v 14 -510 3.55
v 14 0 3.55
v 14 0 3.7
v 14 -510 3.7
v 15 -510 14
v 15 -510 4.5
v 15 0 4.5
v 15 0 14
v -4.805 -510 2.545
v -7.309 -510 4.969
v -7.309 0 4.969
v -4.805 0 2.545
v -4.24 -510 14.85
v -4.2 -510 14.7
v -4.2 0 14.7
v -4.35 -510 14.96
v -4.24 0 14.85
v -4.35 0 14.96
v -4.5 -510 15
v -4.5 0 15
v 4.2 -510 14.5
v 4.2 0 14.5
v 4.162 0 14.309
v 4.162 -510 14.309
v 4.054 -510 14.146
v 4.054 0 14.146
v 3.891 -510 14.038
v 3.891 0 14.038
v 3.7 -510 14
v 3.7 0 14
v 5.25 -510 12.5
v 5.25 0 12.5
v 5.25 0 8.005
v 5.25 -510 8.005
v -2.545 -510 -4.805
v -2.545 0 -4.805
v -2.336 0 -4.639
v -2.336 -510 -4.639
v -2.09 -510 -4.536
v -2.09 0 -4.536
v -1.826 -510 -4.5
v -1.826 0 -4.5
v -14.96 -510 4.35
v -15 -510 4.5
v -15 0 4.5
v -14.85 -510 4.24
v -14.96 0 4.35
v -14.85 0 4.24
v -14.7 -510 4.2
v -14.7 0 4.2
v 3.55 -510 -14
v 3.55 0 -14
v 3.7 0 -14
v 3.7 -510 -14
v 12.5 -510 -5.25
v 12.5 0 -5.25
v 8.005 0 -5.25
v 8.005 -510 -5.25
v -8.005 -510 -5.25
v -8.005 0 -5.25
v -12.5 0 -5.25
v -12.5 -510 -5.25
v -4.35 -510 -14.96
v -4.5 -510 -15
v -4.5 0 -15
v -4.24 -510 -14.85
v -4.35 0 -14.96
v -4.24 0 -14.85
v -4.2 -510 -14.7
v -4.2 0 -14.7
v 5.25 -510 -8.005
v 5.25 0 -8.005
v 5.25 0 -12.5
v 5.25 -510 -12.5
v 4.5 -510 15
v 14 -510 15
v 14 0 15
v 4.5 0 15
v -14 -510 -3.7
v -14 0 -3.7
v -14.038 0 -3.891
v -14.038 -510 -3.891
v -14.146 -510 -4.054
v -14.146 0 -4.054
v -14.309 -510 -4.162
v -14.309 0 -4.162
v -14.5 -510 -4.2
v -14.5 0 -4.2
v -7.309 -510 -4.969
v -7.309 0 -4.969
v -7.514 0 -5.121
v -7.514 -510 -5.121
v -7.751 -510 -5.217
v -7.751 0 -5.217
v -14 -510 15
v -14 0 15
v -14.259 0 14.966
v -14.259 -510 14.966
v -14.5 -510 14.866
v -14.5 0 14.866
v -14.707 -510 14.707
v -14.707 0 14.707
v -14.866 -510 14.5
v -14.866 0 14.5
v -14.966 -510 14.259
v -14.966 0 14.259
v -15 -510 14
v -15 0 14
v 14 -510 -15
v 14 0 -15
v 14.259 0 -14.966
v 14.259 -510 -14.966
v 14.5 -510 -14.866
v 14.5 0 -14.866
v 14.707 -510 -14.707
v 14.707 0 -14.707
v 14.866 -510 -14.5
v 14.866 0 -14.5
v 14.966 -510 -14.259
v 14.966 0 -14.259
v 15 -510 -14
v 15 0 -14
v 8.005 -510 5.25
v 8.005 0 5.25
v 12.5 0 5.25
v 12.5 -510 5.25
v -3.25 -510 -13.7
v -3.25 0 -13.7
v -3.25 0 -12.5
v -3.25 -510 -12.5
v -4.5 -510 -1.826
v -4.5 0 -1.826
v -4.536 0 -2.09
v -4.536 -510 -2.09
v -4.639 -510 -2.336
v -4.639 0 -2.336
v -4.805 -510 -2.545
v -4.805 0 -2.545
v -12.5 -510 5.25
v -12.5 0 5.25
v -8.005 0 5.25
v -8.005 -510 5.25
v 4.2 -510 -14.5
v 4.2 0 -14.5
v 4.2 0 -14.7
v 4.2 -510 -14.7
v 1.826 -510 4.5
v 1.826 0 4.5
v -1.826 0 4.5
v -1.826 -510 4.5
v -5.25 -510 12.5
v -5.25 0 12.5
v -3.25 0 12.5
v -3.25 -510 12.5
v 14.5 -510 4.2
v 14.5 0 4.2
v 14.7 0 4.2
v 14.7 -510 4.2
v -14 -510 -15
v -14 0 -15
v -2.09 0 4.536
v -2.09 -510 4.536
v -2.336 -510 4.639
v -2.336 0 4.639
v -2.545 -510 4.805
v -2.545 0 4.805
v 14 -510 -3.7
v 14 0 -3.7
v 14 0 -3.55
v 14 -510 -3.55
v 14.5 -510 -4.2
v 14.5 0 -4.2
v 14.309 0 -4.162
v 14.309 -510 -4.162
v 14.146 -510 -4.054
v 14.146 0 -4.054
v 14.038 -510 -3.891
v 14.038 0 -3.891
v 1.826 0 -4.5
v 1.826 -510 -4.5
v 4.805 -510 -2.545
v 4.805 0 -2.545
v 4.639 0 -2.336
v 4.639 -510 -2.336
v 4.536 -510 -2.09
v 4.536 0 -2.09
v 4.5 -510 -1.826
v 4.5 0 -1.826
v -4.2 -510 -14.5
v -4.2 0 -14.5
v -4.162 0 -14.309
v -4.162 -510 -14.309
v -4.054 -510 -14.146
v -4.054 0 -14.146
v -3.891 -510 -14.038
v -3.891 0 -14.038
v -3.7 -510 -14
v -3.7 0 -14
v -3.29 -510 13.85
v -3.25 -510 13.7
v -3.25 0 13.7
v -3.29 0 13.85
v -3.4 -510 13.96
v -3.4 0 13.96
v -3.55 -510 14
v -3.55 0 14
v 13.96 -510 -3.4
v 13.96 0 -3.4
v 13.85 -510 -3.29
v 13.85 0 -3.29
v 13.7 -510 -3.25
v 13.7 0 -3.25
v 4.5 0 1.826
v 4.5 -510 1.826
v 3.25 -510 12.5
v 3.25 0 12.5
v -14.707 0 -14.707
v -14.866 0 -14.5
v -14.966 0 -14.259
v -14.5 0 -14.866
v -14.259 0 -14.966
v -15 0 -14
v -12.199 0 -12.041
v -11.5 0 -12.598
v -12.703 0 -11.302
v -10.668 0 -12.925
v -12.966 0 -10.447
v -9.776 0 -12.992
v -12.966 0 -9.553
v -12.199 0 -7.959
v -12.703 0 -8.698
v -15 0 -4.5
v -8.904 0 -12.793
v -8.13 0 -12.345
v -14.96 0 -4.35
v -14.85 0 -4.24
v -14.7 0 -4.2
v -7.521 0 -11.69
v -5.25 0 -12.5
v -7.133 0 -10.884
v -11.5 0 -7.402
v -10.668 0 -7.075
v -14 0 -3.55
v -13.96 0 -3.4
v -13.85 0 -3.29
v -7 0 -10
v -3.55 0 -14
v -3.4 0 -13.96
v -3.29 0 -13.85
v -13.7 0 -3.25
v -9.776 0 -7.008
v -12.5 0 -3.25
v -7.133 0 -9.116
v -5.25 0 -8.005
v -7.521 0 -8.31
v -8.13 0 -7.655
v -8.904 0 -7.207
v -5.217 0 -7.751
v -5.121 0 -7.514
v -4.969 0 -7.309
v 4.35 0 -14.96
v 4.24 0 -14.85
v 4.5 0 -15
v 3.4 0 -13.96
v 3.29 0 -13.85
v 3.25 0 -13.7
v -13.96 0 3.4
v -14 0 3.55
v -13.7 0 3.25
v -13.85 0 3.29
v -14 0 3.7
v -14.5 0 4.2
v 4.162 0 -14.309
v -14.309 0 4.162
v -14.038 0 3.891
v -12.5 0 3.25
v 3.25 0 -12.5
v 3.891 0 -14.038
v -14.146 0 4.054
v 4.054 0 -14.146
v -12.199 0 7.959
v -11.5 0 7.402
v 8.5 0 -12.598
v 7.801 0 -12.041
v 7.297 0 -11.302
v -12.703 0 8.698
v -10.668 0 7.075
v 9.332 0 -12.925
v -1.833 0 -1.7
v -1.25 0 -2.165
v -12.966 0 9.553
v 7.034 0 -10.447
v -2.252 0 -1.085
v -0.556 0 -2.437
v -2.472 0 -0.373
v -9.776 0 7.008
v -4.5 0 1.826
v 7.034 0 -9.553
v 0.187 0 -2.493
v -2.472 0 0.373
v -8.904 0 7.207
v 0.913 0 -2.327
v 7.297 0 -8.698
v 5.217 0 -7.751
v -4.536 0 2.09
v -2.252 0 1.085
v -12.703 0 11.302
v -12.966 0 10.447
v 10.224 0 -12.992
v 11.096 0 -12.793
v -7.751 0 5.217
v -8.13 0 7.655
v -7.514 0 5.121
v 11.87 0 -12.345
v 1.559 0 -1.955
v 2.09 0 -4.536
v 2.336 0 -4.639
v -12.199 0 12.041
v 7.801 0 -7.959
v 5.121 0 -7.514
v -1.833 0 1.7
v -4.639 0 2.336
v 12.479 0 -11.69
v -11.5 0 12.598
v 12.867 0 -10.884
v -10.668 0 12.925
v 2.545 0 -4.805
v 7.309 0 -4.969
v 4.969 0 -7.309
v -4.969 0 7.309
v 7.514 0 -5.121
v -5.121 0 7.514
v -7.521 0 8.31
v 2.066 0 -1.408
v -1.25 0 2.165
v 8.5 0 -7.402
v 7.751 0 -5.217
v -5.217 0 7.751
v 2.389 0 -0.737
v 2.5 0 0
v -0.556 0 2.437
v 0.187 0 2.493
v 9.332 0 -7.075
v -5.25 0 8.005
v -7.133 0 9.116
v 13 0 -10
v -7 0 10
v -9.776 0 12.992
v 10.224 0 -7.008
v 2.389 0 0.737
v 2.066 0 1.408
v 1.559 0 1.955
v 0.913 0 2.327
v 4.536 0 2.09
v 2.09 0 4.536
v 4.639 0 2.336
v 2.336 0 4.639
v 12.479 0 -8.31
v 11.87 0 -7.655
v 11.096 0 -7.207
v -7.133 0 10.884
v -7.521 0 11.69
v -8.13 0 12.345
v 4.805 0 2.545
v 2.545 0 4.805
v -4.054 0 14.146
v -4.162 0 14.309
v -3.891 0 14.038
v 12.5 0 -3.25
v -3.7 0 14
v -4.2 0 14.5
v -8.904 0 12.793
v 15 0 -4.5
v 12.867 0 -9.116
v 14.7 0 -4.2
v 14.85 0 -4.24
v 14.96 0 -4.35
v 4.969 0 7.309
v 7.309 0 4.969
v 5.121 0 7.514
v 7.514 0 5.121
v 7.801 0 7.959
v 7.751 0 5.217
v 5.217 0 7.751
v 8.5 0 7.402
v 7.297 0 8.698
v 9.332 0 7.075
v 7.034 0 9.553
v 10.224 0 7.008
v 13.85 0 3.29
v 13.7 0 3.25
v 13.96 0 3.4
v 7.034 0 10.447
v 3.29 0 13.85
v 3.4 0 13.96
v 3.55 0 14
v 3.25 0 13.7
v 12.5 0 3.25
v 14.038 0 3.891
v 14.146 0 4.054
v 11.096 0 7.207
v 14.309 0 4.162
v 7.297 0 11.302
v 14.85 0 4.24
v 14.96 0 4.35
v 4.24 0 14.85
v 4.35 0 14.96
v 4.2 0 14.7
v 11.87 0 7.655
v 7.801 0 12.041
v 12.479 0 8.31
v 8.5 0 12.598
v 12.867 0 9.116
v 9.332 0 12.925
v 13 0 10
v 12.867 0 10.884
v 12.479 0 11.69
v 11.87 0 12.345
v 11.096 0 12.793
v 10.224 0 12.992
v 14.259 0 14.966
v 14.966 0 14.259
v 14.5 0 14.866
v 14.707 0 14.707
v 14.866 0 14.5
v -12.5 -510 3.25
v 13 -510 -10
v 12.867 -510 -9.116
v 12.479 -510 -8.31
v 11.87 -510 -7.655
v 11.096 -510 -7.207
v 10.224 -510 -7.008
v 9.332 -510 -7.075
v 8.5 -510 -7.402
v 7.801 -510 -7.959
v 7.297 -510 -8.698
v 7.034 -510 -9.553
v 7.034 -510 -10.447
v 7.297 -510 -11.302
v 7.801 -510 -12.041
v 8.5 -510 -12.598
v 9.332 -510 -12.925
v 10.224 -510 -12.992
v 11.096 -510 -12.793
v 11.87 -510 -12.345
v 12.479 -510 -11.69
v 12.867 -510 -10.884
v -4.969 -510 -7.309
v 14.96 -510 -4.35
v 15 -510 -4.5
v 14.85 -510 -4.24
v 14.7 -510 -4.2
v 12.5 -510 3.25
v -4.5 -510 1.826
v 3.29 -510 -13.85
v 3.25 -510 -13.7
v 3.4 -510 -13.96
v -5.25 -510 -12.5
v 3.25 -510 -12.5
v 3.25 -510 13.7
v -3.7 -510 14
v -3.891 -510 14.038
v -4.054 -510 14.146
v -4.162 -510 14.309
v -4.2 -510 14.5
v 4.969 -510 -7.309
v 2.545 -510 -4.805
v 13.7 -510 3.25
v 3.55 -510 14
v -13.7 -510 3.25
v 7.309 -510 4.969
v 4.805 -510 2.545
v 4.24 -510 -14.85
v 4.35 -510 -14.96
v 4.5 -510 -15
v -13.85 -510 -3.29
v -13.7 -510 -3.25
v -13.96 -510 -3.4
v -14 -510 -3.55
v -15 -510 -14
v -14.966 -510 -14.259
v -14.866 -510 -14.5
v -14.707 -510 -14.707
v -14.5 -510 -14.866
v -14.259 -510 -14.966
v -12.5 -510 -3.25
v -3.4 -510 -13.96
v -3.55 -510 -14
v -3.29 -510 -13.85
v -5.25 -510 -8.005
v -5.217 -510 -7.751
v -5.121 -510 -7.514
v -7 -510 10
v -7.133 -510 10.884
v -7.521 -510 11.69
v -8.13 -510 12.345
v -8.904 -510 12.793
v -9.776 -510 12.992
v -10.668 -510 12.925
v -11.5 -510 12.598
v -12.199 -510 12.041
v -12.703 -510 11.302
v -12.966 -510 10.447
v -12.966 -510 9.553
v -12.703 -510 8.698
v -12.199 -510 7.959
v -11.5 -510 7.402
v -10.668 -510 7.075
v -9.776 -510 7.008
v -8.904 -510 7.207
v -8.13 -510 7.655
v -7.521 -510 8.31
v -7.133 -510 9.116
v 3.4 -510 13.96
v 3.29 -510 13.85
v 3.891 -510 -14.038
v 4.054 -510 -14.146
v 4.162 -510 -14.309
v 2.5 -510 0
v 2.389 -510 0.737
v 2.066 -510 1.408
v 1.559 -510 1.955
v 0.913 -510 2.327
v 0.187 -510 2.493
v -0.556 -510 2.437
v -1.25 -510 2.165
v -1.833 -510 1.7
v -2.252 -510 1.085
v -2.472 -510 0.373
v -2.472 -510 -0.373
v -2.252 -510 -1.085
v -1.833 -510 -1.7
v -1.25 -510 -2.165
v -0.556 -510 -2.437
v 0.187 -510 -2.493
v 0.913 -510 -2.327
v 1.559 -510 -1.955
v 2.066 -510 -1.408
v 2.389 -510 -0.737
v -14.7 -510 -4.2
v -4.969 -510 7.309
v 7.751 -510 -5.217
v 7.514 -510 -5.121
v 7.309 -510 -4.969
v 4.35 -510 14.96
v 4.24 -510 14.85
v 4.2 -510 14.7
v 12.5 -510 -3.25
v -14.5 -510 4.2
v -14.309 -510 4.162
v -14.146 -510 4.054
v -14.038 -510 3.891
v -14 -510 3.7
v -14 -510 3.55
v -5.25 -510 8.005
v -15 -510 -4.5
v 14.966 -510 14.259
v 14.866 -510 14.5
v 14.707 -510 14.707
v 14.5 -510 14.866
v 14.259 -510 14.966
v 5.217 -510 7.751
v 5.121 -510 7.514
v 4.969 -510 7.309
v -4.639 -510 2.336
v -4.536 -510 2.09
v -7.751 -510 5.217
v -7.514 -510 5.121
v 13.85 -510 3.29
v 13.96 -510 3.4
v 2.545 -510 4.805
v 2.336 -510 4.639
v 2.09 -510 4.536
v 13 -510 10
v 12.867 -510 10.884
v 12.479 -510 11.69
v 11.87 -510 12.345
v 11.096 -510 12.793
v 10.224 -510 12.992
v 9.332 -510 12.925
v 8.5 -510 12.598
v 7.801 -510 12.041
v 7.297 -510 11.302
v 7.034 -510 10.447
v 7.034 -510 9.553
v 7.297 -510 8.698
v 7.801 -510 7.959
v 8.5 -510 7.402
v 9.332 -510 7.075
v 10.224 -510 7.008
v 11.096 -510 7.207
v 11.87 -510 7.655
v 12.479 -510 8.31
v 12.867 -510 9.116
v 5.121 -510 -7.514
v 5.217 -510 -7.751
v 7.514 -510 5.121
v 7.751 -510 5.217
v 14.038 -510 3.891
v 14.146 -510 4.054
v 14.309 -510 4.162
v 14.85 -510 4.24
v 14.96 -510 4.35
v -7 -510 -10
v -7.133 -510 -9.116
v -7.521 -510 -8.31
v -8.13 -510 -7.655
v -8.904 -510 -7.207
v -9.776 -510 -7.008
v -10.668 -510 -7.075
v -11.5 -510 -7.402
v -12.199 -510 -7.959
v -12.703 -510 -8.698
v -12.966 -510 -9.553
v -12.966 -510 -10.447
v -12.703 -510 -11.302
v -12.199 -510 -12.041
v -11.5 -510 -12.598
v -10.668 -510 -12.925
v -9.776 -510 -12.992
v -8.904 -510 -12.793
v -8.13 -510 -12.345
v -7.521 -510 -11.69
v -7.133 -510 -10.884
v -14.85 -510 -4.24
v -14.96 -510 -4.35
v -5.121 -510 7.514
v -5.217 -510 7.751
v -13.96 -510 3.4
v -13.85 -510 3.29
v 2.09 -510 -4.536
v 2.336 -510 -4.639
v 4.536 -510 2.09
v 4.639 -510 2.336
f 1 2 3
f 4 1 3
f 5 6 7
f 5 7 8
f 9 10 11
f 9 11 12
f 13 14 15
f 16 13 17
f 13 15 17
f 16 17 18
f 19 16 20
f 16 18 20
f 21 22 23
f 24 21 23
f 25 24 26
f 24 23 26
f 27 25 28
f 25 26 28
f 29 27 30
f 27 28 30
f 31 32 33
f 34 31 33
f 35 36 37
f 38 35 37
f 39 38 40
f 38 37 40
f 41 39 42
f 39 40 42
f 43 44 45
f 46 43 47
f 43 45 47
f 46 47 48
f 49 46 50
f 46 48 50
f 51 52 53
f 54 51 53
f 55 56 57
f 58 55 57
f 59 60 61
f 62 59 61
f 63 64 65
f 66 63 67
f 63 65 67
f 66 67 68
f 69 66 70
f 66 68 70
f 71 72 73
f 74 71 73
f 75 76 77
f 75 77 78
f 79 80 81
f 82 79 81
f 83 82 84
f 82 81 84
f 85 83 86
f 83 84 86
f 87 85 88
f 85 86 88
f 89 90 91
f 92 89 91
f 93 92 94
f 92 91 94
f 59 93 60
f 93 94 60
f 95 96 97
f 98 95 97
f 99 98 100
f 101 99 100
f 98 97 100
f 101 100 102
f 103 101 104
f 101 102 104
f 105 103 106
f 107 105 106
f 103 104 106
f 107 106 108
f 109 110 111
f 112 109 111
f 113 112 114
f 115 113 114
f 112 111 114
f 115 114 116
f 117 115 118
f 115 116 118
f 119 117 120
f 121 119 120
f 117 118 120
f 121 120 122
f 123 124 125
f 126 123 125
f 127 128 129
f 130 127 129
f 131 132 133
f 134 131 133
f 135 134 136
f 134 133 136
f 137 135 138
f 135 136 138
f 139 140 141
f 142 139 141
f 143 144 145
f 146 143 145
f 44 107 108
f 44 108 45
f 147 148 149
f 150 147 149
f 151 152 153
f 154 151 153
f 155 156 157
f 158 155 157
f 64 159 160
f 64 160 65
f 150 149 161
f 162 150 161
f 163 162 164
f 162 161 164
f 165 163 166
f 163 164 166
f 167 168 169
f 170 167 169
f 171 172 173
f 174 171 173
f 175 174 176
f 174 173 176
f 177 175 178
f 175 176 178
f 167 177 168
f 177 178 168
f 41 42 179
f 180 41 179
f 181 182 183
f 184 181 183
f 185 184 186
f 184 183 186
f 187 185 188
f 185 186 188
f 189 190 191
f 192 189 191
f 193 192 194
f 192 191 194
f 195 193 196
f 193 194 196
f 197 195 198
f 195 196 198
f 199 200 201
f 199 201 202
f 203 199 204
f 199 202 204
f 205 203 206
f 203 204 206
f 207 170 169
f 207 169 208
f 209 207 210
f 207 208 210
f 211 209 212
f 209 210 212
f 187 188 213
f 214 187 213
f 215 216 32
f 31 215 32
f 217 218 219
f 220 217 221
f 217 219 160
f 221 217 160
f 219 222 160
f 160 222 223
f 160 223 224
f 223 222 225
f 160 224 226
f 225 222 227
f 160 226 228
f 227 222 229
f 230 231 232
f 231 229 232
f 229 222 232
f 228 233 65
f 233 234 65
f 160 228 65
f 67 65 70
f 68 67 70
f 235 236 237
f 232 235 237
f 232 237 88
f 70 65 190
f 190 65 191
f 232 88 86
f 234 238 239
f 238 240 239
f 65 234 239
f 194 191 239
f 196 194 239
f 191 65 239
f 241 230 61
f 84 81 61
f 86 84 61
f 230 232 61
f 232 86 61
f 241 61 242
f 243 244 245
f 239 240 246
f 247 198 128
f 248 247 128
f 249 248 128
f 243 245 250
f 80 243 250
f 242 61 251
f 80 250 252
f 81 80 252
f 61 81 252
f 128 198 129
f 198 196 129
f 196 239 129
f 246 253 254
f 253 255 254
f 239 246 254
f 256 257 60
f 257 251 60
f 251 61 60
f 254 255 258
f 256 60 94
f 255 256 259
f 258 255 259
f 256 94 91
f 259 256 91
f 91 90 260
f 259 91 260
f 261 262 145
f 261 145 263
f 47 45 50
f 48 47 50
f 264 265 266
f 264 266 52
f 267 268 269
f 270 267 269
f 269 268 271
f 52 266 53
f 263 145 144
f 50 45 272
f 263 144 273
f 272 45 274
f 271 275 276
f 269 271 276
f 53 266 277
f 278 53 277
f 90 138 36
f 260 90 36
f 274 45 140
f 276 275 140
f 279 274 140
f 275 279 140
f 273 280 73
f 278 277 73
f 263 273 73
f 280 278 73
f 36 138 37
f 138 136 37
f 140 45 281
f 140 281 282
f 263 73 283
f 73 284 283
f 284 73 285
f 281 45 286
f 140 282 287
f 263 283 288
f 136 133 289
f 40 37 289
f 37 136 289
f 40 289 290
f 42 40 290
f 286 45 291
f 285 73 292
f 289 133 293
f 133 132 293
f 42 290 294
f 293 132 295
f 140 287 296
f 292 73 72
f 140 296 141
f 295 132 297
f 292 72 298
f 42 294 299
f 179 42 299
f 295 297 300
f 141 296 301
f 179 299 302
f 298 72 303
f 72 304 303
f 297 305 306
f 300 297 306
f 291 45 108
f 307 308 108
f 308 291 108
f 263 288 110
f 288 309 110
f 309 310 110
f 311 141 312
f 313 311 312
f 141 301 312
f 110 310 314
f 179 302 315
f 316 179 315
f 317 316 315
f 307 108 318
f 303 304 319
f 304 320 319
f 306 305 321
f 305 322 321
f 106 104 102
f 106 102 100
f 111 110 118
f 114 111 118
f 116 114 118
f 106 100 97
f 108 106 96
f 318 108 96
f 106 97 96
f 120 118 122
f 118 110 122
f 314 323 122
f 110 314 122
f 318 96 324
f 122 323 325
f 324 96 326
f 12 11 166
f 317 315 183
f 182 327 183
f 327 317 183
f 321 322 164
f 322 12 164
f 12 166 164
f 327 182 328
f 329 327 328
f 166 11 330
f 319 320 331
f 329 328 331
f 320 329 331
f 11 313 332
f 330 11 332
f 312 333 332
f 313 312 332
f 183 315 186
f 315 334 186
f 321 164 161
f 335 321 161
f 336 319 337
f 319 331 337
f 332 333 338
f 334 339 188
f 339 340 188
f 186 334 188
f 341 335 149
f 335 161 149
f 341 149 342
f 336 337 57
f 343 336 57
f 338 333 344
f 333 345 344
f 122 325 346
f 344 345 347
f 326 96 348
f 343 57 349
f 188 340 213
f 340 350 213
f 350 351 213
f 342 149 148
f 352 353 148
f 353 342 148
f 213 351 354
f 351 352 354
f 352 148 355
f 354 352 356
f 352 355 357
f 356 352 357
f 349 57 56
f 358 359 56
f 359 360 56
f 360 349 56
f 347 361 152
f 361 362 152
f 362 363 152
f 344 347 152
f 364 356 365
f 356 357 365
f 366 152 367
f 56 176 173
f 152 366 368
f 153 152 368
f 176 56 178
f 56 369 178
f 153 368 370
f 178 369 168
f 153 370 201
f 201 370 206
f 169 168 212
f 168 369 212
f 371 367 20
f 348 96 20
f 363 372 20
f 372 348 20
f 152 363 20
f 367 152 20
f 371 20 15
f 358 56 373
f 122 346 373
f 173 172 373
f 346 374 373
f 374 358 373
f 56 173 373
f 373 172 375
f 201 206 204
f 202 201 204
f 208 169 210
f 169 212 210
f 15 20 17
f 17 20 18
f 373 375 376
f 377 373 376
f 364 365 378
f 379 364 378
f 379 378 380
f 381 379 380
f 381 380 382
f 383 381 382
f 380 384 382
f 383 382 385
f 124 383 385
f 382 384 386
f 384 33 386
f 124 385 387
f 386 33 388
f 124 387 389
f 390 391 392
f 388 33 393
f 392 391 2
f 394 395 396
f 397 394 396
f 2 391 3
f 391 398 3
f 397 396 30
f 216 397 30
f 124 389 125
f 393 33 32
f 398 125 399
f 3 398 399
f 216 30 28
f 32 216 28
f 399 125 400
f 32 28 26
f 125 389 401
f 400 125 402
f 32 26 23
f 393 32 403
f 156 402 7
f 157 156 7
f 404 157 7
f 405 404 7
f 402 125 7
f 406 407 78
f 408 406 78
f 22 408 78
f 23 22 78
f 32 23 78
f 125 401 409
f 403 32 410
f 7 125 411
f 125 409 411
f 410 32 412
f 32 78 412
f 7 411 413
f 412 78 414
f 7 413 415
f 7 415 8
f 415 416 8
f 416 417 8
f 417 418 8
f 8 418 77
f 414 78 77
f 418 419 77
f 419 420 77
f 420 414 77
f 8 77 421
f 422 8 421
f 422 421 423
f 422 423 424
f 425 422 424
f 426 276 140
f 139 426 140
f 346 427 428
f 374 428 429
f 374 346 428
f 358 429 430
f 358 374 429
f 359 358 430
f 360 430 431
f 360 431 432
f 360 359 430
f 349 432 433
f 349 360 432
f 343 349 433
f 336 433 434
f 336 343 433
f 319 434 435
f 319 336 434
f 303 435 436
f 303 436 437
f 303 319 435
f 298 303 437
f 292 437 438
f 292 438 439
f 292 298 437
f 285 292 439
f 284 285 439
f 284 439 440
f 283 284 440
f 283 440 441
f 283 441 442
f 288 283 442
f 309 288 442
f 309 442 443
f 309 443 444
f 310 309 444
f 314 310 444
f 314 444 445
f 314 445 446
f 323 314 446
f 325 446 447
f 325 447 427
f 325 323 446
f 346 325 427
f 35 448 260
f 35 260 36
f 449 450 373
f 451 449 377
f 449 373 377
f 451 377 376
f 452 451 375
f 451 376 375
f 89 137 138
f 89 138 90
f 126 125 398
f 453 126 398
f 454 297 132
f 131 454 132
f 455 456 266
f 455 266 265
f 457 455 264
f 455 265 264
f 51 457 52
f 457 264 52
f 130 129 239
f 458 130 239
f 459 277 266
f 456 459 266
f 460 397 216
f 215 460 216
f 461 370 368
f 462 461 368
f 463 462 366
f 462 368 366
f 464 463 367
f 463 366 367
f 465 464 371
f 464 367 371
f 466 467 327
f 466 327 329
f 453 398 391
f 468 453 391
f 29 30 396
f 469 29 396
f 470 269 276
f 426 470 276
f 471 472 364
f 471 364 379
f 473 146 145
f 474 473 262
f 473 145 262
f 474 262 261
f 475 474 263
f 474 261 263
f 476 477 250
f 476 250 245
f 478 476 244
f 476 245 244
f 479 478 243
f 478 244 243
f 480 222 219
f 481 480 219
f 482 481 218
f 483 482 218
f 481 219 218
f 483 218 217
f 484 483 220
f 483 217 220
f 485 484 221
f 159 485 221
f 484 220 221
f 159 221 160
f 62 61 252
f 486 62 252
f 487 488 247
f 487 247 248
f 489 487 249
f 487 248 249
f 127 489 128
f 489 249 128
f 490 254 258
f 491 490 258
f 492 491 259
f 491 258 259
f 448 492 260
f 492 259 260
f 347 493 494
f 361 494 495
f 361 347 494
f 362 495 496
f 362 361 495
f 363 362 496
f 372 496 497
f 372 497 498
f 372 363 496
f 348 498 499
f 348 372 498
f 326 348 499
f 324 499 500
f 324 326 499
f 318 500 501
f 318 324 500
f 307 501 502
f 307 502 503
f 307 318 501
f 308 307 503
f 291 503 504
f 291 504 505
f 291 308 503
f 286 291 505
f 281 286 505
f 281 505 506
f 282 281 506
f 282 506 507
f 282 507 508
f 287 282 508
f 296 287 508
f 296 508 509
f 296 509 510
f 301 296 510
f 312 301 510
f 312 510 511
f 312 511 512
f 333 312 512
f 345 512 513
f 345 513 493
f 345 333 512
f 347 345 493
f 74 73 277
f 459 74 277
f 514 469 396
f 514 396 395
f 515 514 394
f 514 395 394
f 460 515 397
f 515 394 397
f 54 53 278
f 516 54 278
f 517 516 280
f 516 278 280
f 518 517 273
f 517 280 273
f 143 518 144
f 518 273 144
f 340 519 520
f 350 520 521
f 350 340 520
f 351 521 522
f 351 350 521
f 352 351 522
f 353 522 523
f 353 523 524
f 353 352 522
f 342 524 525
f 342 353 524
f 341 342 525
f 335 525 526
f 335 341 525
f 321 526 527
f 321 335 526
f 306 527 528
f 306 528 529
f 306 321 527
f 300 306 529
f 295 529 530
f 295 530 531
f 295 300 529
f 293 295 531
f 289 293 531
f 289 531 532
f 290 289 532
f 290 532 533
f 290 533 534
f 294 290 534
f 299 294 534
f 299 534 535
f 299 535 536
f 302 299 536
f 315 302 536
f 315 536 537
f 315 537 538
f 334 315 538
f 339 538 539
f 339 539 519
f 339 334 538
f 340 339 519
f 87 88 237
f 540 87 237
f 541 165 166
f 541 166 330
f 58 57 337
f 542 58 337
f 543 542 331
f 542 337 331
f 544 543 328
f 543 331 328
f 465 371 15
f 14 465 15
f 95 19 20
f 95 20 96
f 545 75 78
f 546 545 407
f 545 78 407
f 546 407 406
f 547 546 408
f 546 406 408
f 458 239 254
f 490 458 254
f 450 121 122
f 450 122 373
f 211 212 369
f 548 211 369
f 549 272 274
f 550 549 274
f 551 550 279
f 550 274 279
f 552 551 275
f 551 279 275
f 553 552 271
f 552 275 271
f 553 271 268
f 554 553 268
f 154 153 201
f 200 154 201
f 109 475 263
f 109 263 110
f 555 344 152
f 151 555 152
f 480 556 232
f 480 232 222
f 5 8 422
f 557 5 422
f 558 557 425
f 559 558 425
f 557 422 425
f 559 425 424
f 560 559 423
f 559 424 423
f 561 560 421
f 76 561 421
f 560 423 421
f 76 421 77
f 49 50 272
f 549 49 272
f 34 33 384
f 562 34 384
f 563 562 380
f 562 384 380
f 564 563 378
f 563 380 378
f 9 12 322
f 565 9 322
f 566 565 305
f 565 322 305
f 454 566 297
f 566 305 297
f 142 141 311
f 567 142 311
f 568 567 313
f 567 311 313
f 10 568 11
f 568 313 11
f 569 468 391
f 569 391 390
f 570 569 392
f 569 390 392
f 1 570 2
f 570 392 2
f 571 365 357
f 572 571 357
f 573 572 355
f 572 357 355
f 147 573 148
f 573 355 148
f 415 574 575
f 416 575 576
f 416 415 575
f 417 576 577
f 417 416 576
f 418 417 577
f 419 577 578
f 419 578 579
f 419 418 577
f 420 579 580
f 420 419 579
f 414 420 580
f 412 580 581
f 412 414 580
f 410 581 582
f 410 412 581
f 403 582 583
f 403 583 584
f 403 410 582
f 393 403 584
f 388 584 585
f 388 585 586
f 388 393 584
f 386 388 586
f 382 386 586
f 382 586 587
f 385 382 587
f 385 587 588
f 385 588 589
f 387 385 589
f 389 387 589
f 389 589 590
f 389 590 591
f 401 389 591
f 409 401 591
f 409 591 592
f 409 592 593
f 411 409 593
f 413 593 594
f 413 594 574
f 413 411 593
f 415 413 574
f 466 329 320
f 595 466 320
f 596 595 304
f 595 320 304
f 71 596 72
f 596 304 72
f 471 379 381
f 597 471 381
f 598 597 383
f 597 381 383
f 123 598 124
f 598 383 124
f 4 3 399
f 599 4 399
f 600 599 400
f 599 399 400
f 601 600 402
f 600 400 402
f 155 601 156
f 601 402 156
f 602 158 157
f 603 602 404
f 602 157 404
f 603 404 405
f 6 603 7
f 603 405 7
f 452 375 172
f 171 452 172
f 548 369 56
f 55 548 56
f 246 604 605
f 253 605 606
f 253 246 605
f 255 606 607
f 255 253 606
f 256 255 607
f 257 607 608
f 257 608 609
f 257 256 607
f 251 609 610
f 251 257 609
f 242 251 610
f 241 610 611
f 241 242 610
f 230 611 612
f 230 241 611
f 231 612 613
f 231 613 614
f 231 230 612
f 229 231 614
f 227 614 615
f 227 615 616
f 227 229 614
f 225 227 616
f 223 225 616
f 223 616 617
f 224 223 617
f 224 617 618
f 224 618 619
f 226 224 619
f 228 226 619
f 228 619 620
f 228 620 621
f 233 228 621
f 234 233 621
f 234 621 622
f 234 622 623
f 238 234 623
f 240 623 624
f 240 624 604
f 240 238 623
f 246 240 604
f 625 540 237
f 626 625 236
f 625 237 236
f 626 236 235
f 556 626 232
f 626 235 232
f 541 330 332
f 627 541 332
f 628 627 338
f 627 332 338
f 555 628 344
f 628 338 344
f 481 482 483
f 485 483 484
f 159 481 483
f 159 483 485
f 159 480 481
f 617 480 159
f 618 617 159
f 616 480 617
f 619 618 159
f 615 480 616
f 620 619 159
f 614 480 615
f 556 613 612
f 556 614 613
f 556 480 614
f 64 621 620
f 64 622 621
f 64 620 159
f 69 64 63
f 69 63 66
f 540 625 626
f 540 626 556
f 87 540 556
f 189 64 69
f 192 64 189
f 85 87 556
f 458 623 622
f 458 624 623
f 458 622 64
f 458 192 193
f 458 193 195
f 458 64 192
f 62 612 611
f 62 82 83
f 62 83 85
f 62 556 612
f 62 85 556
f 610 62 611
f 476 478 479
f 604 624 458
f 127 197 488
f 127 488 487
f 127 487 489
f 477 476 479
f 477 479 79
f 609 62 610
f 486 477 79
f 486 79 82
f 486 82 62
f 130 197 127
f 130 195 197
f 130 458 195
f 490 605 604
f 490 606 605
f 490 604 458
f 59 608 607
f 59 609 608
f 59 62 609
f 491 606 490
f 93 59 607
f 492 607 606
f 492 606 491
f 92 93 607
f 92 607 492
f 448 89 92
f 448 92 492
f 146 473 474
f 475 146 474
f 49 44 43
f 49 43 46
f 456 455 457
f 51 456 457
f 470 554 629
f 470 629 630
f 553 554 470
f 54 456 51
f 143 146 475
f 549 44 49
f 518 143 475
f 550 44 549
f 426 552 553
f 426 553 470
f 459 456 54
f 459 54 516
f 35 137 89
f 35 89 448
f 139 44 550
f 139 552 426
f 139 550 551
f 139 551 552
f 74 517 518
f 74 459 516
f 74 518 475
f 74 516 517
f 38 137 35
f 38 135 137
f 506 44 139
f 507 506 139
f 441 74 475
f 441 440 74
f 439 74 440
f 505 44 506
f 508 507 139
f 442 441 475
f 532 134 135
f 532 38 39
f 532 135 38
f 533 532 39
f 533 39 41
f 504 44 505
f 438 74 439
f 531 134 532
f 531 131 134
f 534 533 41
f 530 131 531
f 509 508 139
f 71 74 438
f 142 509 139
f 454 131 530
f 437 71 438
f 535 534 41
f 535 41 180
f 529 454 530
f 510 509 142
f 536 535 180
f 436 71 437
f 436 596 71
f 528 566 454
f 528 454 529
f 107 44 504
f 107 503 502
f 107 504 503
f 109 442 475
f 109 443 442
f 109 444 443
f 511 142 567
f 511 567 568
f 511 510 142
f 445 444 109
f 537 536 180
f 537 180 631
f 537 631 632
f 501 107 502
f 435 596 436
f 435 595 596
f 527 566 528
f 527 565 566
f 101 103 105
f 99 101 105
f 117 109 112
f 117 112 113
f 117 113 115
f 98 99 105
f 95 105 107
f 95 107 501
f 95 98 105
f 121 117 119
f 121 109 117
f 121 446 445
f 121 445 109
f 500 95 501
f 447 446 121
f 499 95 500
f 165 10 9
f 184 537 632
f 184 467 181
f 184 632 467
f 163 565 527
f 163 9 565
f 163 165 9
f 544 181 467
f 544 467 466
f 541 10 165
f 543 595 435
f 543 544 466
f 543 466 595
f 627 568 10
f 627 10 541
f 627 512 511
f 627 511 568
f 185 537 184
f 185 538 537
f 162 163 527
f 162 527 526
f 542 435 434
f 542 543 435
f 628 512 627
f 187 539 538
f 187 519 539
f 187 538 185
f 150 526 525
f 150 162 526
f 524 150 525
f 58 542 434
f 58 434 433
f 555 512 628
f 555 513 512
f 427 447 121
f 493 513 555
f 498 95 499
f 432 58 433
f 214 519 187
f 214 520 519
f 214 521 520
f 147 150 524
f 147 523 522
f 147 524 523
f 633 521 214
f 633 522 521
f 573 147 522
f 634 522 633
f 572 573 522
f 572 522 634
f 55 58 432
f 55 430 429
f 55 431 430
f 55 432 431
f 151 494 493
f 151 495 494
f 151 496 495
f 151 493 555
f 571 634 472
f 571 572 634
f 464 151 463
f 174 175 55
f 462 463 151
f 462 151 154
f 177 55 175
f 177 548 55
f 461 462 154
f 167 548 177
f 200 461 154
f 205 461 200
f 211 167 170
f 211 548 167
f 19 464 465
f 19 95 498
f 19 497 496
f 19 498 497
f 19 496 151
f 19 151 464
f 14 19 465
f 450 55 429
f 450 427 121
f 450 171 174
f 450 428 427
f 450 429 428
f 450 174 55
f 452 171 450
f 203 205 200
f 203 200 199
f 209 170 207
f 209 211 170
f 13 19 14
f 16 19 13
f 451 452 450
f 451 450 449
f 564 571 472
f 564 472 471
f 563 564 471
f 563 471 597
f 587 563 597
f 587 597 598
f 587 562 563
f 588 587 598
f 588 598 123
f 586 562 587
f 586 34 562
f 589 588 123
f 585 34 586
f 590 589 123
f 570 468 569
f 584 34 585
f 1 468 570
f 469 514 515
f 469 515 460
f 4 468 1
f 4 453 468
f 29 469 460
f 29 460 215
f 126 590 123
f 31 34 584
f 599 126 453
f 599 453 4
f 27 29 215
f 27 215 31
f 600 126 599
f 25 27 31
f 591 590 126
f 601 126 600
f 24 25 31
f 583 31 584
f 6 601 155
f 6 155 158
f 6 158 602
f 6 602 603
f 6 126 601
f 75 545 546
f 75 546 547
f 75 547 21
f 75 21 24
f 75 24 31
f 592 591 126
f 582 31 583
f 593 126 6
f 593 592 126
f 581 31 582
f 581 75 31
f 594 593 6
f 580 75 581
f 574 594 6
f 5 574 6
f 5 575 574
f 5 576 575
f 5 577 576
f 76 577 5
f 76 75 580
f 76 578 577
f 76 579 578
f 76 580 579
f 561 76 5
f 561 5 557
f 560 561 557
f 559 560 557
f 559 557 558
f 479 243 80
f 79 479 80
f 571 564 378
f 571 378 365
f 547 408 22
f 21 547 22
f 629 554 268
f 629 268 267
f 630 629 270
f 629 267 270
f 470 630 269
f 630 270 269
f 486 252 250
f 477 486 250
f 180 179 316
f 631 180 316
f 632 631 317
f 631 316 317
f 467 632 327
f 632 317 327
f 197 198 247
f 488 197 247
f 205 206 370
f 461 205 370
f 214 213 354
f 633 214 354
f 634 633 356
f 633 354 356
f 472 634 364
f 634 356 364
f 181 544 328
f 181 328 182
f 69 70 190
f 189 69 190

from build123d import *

# Parameters (mm, degrees)
F0_R     = 3
F0_R_2   = 2.5
F1_DEPTH = 510


with BuildPart() as f1:
    # F0 (on Front) → F1 (new body)
    with BuildSketch(Plane.XZ):
        with BuildLine():
            Line((-4.5, 15), (-14, 15))
            ThreePointArc((-14, 15), (-14.707107, 14.707107), (-15, 14))
            Line((-15, 14), (-15, 4.5))
            ThreePointArc((-15, 4.5), (-14.912132, 4.287868), (-14.7, 4.2))
            Line((-14.7, 4.2), (-14.5, 4.2))
            ThreePointArc((-14.5, 4.2), (-14.146447, 4.053553), (-14, 3.7))
            Line((-14, 3.7), (-14, 3.55))
            ThreePointArc((-14, 3.55), (-13.912132, 3.337868), (-13.7, 3.25))
            Line((-13.7, 3.25), (-12.5, 3.25))
            Line((-12.5, 3.25), (-12.5, 5.25))
            Line((-12.5, 5.25), (-8.004644, 5.25))
            ThreePointArc((-8.004644, 5.25), (-7.629545, 5.176985), (-7.309222, 4.968602))
            Line((-7.309222, 4.968602), (-4.804579, 2.544753))
            ThreePointArc((-4.804579, 2.544753), (-4.579288, 2.216394), (-4.5, 1.826151))
            Line((-4.5, 1.826151), (-4.5, -1.826151))
            ThreePointArc((-4.5, -1.826151), (-4.579288, -2.216394), (-4.804579, -2.544753))
            Line((-4.804579, -2.544753), (-7.309222, -4.968602))
            ThreePointArc((-7.309222, -4.968602), (-7.629545, -5.176985), (-8.004644, -5.25))
            Line((-8.004644, -5.25), (-12.5, -5.25))
            Line((-12.5, -5.25), (-12.5, -3.25))
            Line((-12.5, -3.25), (-13.7, -3.25))
            ThreePointArc((-13.7, -3.25), (-13.912132, -3.337868), (-14, -3.55))
            Line((-14, -3.55), (-14, -3.7))
            ThreePointArc((-14, -3.7), (-14.146447, -4.053553), (-14.5, -4.2))
            Line((-14.5, -4.2), (-14.7, -4.2))
            ThreePointArc((-14.7, -4.2), (-14.912132, -4.287868), (-15, -4.5))
            Line((-15, -4.5), (-15, -14))
            ThreePointArc((-15, -14), (-14.707107, -14.707107), (-14, -15))
            Line((-14, -15), (-4.5, -15))
            ThreePointArc((-4.5, -15), (-4.287868, -14.912132), (-4.2, -14.7))
            Line((-4.2, -14.7), (-4.2, -14.5))
            ThreePointArc((-4.2, -14.5), (-4.053553, -14.146447), (-3.7, -14))
            Line((-3.7, -14), (-3.55, -14))
            ThreePointArc((-3.55, -14), (-3.337868, -13.912132), (-3.25, -13.7))
            Line((-3.25, -13.7), (-3.25, -12.5))
            Line((-3.25, -12.5), (-5.25, -12.5))
            Line((-5.25, -12.5), (-5.25, -8.004644))
            ThreePointArc((-5.25, -8.004644), (-5.176985, -7.629545), (-4.968602, -7.309222))
            Line((-4.968602, -7.309222), (-2.544753, -4.804579))
            ThreePointArc((-2.544753, -4.804579), (-2.216394, -4.579288), (-1.826151, -4.5))
            Line((-1.826151, -4.5), (1.826151, -4.5))
            ThreePointArc((1.826151, -4.5), (2.216394, -4.579288), (2.544753, -4.804579))
            Line((2.544753, -4.804579), (4.968602, -7.309222))
            ThreePointArc((4.968602, -7.309222), (5.176985, -7.629545), (5.25, -8.004644))
            Line((5.25, -8.004644), (5.25, -12.5))
            Line((5.25, -12.5), (3.25, -12.5))
            Line((3.25, -12.5), (3.25, -13.7))
            ThreePointArc((3.25, -13.7), (3.337868, -13.912132), (3.55, -14))
            Line((3.55, -14), (3.7, -14))
            ThreePointArc((3.7, -14), (4.053553, -14.146447), (4.2, -14.5))
            Line((4.2, -14.5), (4.2, -14.7))
            ThreePointArc((4.2, -14.7), (4.287868, -14.912132), (4.5, -15))
            Line((4.5, -15), (14, -15))
            ThreePointArc((14, -15), (14.707107, -14.707107), (15, -14))
            Line((15, -14), (15, -4.5))
            ThreePointArc((15, -4.5), (14.912132, -4.287868), (14.7, -4.2))
            Line((14.7, -4.2), (14.5, -4.2))
            ThreePointArc((14.5, -4.2), (14.146447, -4.053553), (14, -3.7))
            Line((14, -3.7), (14, -3.55))
            ThreePointArc((14, -3.55), (13.912132, -3.337868), (13.7, -3.25))
            Line((13.7, -3.25), (12.5, -3.25))
            Line((12.5, -3.25), (12.5, -5.25))
            Line((12.5, -5.25), (8.004644, -5.25))
            ThreePointArc((8.004644, -5.25), (7.629545, -5.176985), (7.309222, -4.968602))
            Line((7.309222, -4.968602), (4.804579, -2.544753))
            ThreePointArc((4.804579, -2.544753), (4.579288, -2.216394), (4.5, -1.826151))
            Line((4.5, -1.826151), (4.5, 1.826151))
            ThreePointArc((4.5, 1.826151), (4.579288, 2.216394), (4.804579, 2.544753))
            Line((4.804579, 2.544753), (7.309222, 4.968602))
            ThreePointArc((7.309222, 4.968602), (7.629545, 5.176985), (8.004644, 5.25))
            Line((8.004644, 5.25), (12.5, 5.25))
            Line((12.5, 5.25), (12.5, 3.25))
            Line((12.5, 3.25), (13.7, 3.25))
            ThreePointArc((13.7, 3.25), (13.912132, 3.337868), (14, 3.55))
            Line((14, 3.55), (14, 3.7))
            ThreePointArc((14, 3.7), (14.146447, 4.053553), (14.5, 4.2))
            Line((14.5, 4.2), (14.7, 4.2))
            ThreePointArc((14.7, 4.2), (14.912132, 4.287868), (15, 4.5))
            Line((15, 4.5), (15, 14))
            ThreePointArc((15, 14), (14.707107, 14.707107), (14, 15))
            Line((14, 15), (4.5, 15))
            ThreePointArc((4.5, 15), (4.287868, 14.912132), (4.2, 14.7))
            Line((4.2, 14.7), (4.2, 14.5))
            ThreePointArc((4.2, 14.5), (4.053553, 14.146447), (3.7, 14))
            Line((3.7, 14), (3.55, 14))
            ThreePointArc((3.55, 14), (3.337868, 13.912132), (3.25, 13.7))
            Line((3.25, 13.7), (3.25, 12.5))
            Line((3.25, 12.5), (5.25, 12.5))
            Line((5.25, 12.5), (5.25, 8.004644))
            ThreePointArc((5.25, 8.004644), (5.176985, 7.629545), (4.968602, 7.309222))
            Line((4.968602, 7.309222), (2.544753, 4.804579))
            ThreePointArc((2.544753, 4.804579), (2.216394, 4.579288), (1.826151, 4.5))
            Line((1.826151, 4.5), (-1.826151, 4.5))
            ThreePointArc((-1.826151, 4.5), (-2.216394, 4.579288), (-2.544753, 4.804579))
            Line((-2.544753, 4.804579), (-4.968602, 7.309222))
            ThreePointArc((-4.968602, 7.309222), (-5.176985, 7.629545), (-5.25, 8.004644))
            Line((-5.25, 8.004644), (-5.25, 12.5))
            Line((-5.25, 12.5), (-3.25, 12.5))
            Line((-3.25, 12.5), (-3.25, 13.7))
            ThreePointArc((-3.25, 13.7), (-3.337868, 13.912132), (-3.55, 14))
            Line((-3.55, 14), (-3.7, 14))
            ThreePointArc((-3.7, 14), (-4.053553, 14.146447), (-4.2, 14.5))
            Line((-4.2, 14.5), (-4.2, 14.7))
            ThreePointArc((-4.2, 14.7), (-4.287868, 14.912132), (-4.5, 15))
        make_face()
        with Locations((-10, -10)):
            Circle(F0_R, mode=Mode.SUBTRACT)
        with Locations((10, -10)):
            Circle(F0_R, mode=Mode.SUBTRACT)
        with Locations((-10, 10)):
            Circle(F0_R, mode=Mode.SUBTRACT)
        Circle(F0_R_2, mode=Mode.SUBTRACT)
        with Locations((10, 10)):
            Circle(F0_R, mode=Mode.SUBTRACT)
    extrude(amount=F1_DEPTH)


solid = f1.part
